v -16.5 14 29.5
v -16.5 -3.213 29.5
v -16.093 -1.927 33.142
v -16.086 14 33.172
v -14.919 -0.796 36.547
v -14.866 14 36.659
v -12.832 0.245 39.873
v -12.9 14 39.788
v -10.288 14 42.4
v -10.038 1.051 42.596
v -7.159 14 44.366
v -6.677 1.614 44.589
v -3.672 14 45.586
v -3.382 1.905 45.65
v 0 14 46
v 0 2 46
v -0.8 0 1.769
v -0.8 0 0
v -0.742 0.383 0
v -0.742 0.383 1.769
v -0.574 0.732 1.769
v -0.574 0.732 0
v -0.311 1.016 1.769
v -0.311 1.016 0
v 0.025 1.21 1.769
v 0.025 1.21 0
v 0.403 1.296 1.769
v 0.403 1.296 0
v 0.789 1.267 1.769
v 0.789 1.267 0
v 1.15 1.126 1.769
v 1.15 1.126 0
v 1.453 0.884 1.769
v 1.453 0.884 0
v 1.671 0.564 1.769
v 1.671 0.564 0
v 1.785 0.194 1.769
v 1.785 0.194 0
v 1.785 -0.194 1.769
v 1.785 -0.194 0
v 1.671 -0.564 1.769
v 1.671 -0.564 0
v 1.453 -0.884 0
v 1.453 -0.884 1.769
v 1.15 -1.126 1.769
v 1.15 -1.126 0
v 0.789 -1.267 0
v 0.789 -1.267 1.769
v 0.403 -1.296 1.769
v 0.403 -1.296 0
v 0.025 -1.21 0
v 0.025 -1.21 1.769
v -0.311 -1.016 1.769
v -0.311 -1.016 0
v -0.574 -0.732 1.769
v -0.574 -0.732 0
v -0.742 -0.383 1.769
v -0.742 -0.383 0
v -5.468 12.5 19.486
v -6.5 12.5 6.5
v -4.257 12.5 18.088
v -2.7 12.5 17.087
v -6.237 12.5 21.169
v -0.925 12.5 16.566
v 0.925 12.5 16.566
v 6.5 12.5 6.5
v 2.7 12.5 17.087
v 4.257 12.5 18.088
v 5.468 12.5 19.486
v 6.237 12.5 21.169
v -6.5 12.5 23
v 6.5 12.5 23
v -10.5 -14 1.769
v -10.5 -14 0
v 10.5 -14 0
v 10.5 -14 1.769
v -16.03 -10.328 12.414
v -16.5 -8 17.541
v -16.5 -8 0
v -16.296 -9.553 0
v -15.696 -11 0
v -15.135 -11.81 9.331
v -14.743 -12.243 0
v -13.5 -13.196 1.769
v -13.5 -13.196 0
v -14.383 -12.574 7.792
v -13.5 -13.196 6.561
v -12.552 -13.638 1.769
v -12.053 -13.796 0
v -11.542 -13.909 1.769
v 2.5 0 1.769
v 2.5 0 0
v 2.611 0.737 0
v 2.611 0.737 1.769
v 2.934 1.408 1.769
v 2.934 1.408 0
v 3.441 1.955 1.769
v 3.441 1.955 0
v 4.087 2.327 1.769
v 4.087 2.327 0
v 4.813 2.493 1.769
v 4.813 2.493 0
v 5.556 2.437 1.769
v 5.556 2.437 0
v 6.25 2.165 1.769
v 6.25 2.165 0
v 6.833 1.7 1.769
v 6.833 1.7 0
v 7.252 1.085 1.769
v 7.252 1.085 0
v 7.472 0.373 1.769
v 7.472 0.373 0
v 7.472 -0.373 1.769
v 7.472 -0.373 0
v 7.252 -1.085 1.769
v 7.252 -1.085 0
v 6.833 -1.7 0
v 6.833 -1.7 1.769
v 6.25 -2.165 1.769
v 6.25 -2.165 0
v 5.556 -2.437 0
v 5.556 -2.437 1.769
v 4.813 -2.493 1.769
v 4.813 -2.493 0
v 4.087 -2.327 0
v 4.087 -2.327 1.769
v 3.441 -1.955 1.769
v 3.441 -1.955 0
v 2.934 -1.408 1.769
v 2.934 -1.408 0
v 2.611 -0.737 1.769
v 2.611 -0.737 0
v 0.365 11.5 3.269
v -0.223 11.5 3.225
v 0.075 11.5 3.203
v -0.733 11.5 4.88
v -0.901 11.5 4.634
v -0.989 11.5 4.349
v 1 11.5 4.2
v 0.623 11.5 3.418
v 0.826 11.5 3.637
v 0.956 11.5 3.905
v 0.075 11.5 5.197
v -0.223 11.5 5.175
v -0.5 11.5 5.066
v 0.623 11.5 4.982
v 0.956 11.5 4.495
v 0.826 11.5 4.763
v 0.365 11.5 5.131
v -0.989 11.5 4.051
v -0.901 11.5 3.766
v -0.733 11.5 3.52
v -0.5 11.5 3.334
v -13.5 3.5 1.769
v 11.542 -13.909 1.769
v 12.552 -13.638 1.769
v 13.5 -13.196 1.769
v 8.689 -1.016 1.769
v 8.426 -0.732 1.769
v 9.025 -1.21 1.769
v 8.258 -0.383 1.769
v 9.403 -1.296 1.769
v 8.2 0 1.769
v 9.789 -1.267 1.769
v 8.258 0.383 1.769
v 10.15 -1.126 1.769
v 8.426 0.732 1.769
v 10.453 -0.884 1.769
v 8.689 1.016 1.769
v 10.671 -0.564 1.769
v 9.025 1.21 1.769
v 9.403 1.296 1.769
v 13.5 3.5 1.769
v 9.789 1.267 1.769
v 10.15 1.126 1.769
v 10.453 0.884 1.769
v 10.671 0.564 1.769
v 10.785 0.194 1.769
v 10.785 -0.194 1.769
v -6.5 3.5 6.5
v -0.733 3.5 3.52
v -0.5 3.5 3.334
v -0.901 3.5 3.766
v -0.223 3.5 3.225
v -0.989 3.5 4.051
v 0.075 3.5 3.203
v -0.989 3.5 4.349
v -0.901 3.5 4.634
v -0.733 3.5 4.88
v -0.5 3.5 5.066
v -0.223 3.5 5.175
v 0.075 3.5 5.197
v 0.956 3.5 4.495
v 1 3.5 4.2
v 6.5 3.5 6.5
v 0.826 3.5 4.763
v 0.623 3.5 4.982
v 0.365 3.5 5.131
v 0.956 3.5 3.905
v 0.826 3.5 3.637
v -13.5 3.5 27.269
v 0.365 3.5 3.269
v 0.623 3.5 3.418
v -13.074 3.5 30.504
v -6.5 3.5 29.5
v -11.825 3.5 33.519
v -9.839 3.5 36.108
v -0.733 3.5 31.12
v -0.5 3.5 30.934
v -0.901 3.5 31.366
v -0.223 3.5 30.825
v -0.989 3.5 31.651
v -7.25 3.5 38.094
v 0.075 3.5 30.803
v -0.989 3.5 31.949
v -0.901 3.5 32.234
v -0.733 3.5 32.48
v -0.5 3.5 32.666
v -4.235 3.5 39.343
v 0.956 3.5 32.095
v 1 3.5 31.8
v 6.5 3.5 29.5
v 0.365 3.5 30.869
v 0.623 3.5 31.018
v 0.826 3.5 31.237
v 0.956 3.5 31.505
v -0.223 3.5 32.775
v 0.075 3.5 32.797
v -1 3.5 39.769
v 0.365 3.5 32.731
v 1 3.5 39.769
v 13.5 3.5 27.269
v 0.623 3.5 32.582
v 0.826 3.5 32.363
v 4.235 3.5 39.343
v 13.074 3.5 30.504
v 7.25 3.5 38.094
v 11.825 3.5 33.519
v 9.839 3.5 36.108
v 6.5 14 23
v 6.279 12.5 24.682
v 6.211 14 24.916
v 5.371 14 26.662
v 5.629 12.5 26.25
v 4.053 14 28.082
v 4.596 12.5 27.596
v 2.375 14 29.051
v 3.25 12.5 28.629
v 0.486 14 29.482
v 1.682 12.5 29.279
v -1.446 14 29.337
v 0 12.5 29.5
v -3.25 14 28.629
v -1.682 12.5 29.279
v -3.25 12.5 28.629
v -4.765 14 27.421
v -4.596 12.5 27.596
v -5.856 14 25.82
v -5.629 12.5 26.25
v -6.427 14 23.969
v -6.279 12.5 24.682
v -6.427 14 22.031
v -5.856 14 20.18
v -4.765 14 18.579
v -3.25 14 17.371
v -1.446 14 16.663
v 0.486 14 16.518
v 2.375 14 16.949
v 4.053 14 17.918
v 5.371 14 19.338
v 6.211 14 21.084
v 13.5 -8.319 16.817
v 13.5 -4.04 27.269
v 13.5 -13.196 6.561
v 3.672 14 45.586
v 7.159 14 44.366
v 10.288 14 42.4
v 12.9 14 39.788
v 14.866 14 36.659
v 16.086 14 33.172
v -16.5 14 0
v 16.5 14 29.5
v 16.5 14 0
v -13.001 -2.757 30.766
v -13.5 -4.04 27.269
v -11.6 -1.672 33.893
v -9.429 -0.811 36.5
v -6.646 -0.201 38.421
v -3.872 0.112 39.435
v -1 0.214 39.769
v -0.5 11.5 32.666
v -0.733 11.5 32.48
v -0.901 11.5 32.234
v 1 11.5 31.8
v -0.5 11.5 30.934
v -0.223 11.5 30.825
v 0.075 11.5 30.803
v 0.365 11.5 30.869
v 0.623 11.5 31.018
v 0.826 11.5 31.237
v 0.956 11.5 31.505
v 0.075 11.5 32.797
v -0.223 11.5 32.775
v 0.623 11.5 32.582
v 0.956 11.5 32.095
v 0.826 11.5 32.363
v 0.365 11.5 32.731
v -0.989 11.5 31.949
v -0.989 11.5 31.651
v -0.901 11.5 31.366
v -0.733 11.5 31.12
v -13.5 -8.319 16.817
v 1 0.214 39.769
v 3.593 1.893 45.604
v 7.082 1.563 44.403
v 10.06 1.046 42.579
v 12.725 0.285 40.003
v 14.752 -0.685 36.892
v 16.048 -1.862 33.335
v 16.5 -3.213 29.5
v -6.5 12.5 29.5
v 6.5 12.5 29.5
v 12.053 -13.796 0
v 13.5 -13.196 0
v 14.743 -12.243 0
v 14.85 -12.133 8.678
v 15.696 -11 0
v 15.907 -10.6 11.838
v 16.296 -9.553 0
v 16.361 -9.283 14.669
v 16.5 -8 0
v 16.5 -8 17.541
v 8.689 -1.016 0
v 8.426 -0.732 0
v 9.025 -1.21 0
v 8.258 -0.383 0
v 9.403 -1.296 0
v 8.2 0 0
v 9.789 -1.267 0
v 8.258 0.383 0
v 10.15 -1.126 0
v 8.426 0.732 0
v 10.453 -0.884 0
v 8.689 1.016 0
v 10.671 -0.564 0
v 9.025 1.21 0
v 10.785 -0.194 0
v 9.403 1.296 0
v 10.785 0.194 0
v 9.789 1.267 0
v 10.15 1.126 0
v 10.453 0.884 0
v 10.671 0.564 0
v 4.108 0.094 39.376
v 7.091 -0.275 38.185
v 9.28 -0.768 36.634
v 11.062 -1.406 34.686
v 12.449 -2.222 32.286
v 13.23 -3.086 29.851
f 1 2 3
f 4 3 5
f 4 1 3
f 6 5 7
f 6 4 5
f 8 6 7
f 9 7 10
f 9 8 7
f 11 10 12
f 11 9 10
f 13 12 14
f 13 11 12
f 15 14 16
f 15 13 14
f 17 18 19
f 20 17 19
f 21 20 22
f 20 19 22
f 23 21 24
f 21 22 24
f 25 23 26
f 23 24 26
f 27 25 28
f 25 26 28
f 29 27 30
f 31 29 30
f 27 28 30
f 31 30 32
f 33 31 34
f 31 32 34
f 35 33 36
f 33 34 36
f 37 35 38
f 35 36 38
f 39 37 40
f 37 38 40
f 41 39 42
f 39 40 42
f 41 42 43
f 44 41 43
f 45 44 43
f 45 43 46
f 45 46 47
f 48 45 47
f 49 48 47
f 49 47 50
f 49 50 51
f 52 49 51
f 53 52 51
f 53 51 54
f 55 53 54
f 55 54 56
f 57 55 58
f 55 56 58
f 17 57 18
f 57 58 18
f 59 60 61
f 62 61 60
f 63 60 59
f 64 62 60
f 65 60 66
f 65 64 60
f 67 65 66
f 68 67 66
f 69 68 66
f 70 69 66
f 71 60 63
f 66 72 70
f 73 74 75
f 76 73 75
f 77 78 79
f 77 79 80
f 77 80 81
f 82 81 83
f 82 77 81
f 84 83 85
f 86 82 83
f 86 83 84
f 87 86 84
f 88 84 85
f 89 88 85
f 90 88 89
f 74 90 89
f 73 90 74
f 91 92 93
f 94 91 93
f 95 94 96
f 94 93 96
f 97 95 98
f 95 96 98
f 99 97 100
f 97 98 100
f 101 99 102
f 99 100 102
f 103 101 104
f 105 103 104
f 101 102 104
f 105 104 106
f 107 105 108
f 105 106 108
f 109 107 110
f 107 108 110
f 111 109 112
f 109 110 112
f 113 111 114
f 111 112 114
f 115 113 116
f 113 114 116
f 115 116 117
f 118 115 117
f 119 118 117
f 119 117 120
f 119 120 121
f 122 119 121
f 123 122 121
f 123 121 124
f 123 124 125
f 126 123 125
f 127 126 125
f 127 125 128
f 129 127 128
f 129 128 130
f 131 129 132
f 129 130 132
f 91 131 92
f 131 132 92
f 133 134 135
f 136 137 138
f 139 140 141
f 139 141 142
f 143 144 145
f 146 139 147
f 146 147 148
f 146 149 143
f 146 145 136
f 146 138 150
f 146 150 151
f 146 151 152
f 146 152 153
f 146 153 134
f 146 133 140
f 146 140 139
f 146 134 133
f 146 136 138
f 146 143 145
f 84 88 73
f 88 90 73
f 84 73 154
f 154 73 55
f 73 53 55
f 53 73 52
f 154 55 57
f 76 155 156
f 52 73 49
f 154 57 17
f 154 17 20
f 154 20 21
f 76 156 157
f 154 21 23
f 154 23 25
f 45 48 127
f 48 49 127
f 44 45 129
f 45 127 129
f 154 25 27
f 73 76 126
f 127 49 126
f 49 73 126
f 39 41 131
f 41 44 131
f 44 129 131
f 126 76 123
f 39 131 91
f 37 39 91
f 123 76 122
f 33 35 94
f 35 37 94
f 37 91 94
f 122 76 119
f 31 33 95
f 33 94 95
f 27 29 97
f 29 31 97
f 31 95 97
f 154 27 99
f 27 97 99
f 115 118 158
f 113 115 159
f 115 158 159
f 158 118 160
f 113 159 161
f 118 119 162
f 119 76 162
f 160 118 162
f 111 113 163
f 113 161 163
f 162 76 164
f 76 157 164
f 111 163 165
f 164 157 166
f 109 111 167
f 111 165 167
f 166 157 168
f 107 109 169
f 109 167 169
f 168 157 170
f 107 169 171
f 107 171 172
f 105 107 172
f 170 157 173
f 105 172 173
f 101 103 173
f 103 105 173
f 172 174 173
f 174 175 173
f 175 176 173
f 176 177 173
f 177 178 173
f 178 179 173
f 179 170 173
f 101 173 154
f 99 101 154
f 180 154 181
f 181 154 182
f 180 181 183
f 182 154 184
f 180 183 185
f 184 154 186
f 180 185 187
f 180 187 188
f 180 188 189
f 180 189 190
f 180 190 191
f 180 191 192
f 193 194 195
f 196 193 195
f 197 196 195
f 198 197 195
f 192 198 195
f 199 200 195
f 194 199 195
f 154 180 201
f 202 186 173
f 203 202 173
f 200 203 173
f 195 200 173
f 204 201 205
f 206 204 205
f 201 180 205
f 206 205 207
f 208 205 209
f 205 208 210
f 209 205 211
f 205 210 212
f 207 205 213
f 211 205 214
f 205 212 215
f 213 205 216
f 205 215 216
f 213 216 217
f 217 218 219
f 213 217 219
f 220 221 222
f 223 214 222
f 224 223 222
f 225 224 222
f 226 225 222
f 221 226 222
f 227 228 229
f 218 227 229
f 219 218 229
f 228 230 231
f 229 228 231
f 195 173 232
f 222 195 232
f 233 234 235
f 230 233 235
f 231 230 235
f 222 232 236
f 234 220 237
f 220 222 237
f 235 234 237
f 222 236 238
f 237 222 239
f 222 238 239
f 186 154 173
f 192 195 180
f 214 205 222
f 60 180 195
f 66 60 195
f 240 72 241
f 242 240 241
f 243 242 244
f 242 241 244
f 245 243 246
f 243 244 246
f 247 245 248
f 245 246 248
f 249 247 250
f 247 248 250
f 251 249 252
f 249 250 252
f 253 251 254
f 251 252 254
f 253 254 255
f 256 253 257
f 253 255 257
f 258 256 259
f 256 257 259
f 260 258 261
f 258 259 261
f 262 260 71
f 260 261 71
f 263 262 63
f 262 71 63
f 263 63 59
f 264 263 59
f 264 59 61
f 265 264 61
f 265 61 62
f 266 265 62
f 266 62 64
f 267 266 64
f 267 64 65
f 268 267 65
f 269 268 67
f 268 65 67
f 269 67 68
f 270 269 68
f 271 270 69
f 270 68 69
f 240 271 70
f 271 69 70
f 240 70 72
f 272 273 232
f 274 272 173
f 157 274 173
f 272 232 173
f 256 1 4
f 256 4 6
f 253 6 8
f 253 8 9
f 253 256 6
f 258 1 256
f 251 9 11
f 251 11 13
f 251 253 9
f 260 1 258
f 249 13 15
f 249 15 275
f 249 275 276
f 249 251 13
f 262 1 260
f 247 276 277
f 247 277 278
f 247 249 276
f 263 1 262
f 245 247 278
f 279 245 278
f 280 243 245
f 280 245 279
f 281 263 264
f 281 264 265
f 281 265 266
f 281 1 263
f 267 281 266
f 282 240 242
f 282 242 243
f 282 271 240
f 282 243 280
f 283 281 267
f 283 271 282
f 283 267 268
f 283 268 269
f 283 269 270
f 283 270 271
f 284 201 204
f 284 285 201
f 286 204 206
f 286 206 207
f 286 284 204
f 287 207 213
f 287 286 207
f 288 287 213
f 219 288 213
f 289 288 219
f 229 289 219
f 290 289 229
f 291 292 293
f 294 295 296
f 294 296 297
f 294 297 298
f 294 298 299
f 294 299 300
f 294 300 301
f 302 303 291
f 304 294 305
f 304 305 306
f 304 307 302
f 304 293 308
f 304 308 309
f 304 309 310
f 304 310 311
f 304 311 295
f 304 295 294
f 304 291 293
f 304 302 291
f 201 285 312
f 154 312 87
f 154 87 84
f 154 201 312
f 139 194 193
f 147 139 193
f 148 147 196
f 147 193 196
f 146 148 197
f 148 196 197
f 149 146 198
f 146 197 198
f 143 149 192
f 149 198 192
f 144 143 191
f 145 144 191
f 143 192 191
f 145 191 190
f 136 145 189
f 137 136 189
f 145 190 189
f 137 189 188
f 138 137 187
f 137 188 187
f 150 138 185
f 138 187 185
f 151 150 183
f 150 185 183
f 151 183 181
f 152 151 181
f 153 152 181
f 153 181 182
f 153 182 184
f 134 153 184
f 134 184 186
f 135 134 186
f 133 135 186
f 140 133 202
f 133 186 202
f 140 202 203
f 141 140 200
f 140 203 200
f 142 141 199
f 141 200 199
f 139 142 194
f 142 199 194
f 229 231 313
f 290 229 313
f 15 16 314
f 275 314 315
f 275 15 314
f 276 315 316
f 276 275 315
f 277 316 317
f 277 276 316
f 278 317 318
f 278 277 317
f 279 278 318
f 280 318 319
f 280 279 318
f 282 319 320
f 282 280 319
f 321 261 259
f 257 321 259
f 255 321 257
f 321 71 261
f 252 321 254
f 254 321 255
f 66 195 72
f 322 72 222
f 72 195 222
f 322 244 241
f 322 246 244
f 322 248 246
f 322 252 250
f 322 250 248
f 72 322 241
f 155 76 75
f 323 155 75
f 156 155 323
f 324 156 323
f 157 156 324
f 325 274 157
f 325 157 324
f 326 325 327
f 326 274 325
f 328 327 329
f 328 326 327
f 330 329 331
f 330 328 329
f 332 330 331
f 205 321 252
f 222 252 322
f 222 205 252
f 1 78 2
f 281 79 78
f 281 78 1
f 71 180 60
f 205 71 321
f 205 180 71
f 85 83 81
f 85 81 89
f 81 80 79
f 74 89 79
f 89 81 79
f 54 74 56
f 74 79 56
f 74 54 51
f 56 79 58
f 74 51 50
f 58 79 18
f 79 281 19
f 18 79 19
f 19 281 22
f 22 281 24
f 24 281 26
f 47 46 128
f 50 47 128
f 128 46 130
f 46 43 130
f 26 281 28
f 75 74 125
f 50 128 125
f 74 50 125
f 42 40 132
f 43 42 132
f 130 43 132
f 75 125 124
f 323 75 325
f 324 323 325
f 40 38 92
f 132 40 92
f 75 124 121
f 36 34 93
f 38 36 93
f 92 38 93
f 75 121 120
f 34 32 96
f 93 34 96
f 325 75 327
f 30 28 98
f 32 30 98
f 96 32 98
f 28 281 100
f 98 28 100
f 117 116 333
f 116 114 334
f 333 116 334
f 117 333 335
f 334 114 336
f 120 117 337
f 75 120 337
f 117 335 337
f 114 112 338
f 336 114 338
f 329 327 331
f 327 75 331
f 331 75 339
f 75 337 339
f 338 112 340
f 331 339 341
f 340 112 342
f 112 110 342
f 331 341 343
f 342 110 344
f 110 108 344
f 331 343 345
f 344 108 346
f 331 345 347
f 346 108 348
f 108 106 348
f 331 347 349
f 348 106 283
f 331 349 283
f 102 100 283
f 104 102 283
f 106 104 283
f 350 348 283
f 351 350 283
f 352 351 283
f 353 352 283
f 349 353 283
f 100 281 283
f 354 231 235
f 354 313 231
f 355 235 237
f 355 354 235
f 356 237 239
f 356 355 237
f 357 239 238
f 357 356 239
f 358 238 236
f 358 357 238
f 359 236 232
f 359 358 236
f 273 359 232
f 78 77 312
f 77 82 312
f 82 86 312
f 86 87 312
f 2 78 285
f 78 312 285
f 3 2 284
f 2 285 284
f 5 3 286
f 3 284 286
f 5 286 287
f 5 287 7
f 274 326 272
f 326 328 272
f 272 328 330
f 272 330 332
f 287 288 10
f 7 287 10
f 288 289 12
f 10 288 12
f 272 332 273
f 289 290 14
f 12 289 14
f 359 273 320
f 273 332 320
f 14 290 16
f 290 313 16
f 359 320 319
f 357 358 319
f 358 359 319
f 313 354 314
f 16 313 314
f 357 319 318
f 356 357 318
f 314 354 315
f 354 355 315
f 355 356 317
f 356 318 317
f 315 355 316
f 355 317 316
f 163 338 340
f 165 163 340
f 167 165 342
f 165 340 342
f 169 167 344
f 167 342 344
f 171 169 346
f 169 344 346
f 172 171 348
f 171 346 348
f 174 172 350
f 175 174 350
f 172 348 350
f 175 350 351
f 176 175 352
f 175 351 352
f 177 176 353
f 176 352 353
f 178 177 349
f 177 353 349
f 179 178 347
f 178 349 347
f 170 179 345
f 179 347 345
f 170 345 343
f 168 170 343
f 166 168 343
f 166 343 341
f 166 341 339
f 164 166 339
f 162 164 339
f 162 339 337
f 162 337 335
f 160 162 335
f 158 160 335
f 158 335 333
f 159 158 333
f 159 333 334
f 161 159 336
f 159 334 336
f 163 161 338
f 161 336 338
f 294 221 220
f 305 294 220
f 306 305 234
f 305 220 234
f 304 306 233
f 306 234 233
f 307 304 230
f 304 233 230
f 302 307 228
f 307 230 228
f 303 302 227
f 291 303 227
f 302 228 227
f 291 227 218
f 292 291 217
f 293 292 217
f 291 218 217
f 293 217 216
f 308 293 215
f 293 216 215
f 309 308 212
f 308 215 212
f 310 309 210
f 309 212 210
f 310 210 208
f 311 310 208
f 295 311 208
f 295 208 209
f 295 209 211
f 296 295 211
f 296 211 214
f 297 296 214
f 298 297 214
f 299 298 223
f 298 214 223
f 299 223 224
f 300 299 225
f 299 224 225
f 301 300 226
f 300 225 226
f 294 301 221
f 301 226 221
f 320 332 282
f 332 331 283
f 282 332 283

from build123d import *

# Parameters (mm, degrees)
SKETCH1_W           = 33
SKETCH1_H           = 28
BOSS_EXTRUDE1_DEPTH = 46
CUT_EXTRUDE1_DEPTH  = 46
CUT_EXTRUDE2_START  = -3
CUT_EXTRUDE2_DEPTH  = 27
FILLET2_R           = 12.5
FILLET3_R           = 16.5
FILLET4_R           = 6
SKETCH4_W           = 13
SKETCH4_H           = 23
CUT_EXTRUDE3_DEPTH  = 9
SKETCH5_R           = 6.5
CUT_EXTRUDE4_DEPTH  = 56.592265809
SKETCH6_R           = 1
CUT_EXTRUDE5_DEPTH  = 8
SKETCH7_R           = 1.3
SKETCH7_R_2         = 2.5
CUT_EXTRUDE6_DEPTH  = 1.769084801


with BuildPart() as part:
    # Sketch1 → Boss-Extrude1 (new body)
    with BuildSketch(Plane.XY):
        Rectangle(SKETCH1_W, SKETCH1_H)
    extrude(amount=BOSS_EXTRUDE1_DEPTH)

    # Sketch2 → Cut-Extrude1 (cut)
    with BuildSketch(Plane(origin=(16.5, 0, 0), x_dir=(0, 0, -1), z_dir=(1, 0, 0))):
        with BuildLine():
            Line((-46, 2), (-46, -14))
            Line((-46, -14), (-5, -14))
            add(Edge.make_bspline(
                [(-5, -14), (-24.751807392, -3.724011785), (-46, 2)],
                knots=[0, 0, 0, 1, 1, 1], degree=2))
        make_face()
    extrude(amount=-CUT_EXTRUDE1_DEPTH, mode=Mode.SUBTRACT)

    # Sketch3 → Cut-Extrude2 (cut)
    with BuildSketch(Plane(origin=(16.5, 0, 0), x_dir=(0, 0, -1), z_dir=(1, 0, 0)).offset(CUT_EXTRUDE2_START)):
        with BuildLine():
            Line((-5, -14), (-1.769084801, -14))
            Line((-1.769084801, -14), (-1.769084801, 3.5))
            Line((-1.769084801, 3.5), (-39.769084801, 3.5))
            Line((-39.769084801, 3.5), (-39.769084801, 0.213825967))
            add(Edge.make_bspline(
                [(-5, -14), (-21.840644779, -5.238560409), (-39.769084801, 0.213825967)],
                knots=[0, 0, 0, 1, 1, 1], degree=2))
        make_face()
    extrude(amount=-CUT_EXTRUDE2_DEPTH, mode=Mode.SUBTRACT)

    # Fillet2
    fillet2_edges = [part.edges().sort_by_distance(p)[0] for p in [
        (13.5, 1.856912984, 39.769084801),
        (-13.5, 1.856912984, 39.769084801),
    ]]
    fillet(fillet2_edges, radius=FILLET2_R)

    # Fillet3
    fillet3_edges = [part.edges().sort_by_distance(p)[0] for p in [
        (16.5, 8, 46),
        (-16.5, 8, 46),
    ]]
    fillet(fillet3_edges, radius=FILLET3_R - 0.0001)  # a hair under: the kernel refuses the full size

    # Fillet4
    fillet4_edges = [part.edges().sort_by_distance(p)[0] for p in [
        (-16.5, -14, 2.5),
        (16.5, -14, 2.5),
    ]]
    fillet(fillet4_edges, radius=FILLET4_R)

    # Sketch4 → Cut-Extrude3 (cut)
    with BuildSketch(Plane.XZ.offset(-3.5)):
        with Locations((0, 18)):
            Rectangle(SKETCH4_W, SKETCH4_H)
    extrude(amount=-CUT_EXTRUDE3_DEPTH, mode=Mode.SUBTRACT)

    # Sketch5 → Cut-Extrude4 (cut, through all)
    with BuildSketch(Plane.XZ.offset(-12.5)):
        with Locations((0, 23)):
            Circle(SKETCH5_R)
    extrude(amount=-CUT_EXTRUDE4_DEPTH, mode=Mode.SUBTRACT)

    # Sketch6 → Cut-Extrude5 (cut)
    with BuildSketch(Plane.XZ.offset(-3.5)):
        with Locations((0, 31.8)):
            Circle(SKETCH6_R)
        with Locations((0, 4.2)):
            Circle(SKETCH6_R)
    extrude(amount=-CUT_EXTRUDE5_DEPTH, mode=Mode.SUBTRACT)

    # Sketch7 → Cut-Extrude6 (cut)
    with BuildSketch(Plane(origin=(0, 0, 0), x_dir=(-1, 0, 0), z_dir=(0, 0, -1))):
        with Locations((-9.5, 0)):
            Circle(SKETCH7_R)
        with Locations((-5, 0)):
            Circle(SKETCH7_R_2)
        with Locations((-0.5, 0)):
            Circle(SKETCH7_R)
    extrude(amount=-CUT_EXTRUDE6_DEPTH, mode=Mode.SUBTRACT)


solid = part.part
